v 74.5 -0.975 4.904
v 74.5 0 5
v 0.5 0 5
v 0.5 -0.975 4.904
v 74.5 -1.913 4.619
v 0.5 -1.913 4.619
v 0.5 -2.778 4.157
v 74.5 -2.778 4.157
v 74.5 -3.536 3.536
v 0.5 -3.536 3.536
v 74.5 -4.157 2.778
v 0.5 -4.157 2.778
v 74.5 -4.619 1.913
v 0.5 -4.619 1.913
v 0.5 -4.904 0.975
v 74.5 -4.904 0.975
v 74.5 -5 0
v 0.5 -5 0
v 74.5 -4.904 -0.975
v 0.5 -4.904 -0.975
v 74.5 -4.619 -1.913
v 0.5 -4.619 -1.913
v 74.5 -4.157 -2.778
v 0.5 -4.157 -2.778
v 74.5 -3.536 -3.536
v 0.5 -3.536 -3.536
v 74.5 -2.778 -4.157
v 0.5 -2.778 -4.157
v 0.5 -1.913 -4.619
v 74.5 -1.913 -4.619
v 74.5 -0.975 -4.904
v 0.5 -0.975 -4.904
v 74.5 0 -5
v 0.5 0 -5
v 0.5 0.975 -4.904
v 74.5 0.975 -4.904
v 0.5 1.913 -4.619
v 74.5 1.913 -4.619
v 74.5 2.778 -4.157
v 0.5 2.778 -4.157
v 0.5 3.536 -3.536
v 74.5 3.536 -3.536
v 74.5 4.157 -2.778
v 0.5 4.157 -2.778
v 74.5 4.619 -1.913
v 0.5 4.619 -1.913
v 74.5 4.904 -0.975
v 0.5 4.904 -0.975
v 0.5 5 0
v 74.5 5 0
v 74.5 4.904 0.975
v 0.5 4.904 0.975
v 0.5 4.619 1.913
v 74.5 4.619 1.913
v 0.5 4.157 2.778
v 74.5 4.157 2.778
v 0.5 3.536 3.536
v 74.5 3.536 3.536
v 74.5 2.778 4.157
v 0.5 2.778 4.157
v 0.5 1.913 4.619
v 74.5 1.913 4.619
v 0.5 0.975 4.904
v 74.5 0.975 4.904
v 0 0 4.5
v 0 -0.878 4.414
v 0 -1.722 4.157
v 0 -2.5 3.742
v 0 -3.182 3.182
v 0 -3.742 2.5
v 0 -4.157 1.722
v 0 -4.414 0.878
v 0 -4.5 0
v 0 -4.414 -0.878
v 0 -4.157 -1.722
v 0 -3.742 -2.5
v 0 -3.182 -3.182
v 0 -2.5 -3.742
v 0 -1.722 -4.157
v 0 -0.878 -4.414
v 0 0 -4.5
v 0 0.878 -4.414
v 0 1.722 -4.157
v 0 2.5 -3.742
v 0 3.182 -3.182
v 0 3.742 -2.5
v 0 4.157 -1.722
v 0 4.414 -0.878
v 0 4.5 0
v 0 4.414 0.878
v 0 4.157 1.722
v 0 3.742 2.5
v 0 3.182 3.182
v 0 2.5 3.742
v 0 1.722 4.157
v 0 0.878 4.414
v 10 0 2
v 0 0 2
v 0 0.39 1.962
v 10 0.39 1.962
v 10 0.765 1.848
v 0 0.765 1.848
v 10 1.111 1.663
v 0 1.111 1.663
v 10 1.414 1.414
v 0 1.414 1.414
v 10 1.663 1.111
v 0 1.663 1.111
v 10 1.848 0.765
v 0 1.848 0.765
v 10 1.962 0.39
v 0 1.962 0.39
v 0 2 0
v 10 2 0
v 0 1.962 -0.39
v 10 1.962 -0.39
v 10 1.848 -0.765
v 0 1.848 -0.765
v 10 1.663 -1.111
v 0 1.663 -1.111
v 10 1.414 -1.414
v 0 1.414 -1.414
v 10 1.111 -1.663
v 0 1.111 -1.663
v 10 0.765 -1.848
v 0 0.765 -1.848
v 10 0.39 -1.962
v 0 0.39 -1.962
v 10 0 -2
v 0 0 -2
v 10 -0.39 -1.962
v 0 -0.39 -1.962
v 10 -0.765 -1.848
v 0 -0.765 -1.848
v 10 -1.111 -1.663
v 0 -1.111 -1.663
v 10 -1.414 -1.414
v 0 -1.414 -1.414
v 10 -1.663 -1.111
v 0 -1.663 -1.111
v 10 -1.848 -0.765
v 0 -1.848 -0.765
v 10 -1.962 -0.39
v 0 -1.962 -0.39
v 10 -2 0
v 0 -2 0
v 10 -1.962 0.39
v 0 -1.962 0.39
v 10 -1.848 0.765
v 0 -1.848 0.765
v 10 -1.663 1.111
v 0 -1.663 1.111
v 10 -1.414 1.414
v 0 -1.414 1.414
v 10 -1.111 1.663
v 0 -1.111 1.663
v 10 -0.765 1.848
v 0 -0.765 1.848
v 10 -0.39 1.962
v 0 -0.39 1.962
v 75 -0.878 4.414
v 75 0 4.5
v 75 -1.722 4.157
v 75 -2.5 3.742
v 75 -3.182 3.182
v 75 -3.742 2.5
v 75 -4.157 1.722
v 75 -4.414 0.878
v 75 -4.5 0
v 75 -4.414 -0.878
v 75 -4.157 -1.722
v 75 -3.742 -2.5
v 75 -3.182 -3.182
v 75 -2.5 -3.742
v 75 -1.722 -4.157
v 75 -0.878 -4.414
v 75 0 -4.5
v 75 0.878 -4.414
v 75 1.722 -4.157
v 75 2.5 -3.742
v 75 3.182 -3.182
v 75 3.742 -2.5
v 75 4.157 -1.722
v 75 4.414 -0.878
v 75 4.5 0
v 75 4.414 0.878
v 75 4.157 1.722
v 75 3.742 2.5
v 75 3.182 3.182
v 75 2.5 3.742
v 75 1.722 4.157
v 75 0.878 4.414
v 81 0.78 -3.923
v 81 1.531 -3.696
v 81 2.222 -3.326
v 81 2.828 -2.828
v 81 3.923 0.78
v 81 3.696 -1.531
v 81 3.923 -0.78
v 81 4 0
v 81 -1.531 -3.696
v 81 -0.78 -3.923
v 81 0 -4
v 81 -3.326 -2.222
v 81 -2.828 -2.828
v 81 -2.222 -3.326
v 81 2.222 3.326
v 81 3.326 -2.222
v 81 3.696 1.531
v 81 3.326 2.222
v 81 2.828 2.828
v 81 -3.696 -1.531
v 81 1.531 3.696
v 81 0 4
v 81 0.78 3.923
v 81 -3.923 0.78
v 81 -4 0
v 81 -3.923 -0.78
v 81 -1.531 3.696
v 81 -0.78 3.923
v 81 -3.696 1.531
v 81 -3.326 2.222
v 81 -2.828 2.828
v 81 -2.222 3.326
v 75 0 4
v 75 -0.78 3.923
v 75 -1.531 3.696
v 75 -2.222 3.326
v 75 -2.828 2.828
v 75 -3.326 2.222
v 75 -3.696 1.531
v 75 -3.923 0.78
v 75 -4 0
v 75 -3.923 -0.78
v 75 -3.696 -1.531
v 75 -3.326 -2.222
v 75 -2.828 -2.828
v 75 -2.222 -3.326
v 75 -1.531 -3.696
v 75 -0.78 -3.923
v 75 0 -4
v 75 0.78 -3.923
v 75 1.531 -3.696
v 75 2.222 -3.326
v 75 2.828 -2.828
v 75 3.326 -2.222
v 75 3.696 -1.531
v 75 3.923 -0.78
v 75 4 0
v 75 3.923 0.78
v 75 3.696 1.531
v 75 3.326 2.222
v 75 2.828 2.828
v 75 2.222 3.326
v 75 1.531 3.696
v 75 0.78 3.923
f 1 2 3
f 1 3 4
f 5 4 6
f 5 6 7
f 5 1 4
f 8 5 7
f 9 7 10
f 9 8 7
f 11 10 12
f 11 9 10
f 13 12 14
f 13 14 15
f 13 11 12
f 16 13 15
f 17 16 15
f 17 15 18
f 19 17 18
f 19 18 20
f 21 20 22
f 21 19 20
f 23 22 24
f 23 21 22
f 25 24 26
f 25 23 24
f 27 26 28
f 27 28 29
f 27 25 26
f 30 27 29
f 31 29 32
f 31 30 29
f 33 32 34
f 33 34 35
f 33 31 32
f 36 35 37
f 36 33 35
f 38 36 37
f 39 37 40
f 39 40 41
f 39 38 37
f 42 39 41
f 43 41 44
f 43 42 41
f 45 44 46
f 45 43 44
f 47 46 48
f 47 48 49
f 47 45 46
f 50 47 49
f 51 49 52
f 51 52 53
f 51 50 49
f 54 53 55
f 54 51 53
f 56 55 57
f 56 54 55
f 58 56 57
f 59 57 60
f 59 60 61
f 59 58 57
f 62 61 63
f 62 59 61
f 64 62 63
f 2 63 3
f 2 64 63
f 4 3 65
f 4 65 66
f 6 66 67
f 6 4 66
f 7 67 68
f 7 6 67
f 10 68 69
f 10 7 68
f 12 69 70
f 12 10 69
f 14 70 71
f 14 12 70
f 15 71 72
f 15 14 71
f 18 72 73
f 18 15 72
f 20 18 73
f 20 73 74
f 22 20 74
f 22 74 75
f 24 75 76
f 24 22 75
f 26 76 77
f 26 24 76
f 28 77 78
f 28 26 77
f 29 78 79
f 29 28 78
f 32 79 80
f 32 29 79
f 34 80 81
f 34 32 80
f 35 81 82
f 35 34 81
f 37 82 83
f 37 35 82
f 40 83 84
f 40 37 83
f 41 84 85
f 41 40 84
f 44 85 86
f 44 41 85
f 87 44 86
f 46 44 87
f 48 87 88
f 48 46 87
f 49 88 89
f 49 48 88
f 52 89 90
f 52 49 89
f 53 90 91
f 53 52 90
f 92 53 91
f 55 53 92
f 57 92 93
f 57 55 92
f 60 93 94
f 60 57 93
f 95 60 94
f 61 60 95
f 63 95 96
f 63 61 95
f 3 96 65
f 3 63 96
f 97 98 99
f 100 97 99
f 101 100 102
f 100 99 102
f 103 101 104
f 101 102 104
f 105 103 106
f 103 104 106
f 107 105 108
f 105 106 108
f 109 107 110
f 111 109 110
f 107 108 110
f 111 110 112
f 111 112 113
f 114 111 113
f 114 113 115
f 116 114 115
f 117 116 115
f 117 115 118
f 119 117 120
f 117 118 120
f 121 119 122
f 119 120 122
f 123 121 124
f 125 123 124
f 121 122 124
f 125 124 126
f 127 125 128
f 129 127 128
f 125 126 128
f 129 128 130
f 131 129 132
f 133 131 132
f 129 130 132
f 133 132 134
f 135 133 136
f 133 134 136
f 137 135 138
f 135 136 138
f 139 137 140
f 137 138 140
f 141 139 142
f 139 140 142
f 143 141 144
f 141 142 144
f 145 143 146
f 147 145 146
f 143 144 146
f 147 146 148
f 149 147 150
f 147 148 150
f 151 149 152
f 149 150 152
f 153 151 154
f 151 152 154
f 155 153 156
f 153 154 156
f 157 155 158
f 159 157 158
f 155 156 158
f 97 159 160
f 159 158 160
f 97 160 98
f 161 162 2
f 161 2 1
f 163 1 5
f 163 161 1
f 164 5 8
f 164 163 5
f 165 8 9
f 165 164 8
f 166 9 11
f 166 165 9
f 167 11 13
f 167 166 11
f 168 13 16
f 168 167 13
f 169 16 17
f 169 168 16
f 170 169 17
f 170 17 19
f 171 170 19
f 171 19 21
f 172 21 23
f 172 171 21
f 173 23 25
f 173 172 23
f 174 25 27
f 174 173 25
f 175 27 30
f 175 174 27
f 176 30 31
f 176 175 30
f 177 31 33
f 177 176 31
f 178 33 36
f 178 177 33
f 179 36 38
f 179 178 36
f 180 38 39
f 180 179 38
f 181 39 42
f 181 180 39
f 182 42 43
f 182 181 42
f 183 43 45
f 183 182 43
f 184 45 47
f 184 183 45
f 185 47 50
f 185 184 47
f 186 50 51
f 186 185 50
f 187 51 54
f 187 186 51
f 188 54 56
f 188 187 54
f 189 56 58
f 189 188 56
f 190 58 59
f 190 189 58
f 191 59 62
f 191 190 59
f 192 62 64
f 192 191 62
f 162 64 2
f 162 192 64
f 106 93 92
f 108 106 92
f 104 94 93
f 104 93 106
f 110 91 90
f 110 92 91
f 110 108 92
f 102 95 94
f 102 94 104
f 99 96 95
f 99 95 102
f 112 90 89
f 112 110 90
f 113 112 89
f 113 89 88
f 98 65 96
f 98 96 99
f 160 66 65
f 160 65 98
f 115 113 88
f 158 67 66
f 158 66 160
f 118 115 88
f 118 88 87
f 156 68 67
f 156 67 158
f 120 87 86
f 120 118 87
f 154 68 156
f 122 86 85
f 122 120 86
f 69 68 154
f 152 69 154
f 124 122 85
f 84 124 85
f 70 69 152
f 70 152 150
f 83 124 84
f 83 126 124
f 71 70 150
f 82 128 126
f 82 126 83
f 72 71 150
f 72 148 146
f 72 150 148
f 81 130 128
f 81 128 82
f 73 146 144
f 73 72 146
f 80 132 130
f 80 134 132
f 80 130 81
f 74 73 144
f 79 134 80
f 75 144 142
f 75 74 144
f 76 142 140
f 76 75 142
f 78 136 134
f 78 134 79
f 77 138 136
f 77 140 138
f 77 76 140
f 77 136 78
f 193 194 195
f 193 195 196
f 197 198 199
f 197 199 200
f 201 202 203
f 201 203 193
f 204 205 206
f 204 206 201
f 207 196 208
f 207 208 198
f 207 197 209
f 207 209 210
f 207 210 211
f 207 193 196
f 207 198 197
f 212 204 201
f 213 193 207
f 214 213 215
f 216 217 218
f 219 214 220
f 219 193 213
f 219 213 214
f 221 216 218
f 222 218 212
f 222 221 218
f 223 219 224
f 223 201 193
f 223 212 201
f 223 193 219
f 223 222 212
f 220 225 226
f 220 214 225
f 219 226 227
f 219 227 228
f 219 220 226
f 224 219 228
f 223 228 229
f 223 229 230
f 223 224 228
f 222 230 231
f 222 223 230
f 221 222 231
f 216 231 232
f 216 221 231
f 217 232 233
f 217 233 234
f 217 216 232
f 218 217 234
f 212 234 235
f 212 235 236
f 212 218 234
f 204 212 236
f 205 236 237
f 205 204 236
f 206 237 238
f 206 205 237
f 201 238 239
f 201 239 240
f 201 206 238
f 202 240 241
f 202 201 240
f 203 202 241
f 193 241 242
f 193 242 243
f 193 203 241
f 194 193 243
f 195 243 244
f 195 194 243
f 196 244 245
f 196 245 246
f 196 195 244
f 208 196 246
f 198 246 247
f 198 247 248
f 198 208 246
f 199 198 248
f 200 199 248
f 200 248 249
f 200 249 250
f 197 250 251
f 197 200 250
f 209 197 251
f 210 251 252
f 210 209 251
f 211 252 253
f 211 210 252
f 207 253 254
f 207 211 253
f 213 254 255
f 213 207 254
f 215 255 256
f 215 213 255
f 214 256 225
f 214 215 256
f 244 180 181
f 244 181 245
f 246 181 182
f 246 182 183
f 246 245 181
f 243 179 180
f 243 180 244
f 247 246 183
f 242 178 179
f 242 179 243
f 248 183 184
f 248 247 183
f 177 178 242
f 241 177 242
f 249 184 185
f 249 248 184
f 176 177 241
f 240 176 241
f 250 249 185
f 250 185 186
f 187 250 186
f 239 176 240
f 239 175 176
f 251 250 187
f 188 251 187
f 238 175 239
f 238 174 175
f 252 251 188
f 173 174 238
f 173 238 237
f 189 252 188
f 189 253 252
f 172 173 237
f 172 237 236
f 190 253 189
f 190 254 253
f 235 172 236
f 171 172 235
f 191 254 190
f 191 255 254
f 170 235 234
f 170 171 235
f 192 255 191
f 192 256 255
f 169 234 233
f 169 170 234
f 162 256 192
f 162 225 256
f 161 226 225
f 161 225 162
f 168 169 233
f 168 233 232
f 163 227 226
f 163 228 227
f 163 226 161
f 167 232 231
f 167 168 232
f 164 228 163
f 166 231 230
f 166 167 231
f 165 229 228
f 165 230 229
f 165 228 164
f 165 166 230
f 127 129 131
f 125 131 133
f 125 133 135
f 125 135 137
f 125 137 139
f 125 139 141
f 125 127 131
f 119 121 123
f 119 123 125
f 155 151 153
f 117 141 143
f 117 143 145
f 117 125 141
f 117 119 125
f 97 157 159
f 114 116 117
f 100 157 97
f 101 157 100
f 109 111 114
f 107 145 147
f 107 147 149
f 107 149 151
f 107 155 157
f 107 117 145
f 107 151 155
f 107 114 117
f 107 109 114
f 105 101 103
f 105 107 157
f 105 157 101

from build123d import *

# Parameters (mm, degrees)
CHAMFER1_SIZE      = 0.5
SKETCH6_R          = 2
CUT_EXTRUDE1_DEPTH = 10


with BuildPart() as part:
    # Sketch1 → Revolve1 (revolve)
    with BuildSketch(Plane.XY, mode=Mode.PRIVATE) as revolve1_sk:
        Polygon((0, 0), (0, 5), (75, 5), (75, 4), (81, 4), (81, 0), align=None)
    revolve(revolve1_sk.sketch.rotate(Axis((-21.625122332, 0, 0), (1, 0, 0)), 90), axis=Axis((-21.625122332, 0, 0), (1, 0, 0)))

    # Chamfer1
    chamfer1_edges = [part.edges().sort_by_distance(p)[0] for p in [
        (75, 0, -5),
        (0, 0, -5),
    ]]
    chamfer(chamfer1_edges, length=CHAMFER1_SIZE)

    # Sketch6 → Cut-Extrude1 (cut)
    with BuildSketch(Plane.ZY):
        Circle(SKETCH6_R)
    extrude(amount=-CUT_EXTRUDE1_DEPTH, mode=Mode.SUBTRACT)


solid = part.part
